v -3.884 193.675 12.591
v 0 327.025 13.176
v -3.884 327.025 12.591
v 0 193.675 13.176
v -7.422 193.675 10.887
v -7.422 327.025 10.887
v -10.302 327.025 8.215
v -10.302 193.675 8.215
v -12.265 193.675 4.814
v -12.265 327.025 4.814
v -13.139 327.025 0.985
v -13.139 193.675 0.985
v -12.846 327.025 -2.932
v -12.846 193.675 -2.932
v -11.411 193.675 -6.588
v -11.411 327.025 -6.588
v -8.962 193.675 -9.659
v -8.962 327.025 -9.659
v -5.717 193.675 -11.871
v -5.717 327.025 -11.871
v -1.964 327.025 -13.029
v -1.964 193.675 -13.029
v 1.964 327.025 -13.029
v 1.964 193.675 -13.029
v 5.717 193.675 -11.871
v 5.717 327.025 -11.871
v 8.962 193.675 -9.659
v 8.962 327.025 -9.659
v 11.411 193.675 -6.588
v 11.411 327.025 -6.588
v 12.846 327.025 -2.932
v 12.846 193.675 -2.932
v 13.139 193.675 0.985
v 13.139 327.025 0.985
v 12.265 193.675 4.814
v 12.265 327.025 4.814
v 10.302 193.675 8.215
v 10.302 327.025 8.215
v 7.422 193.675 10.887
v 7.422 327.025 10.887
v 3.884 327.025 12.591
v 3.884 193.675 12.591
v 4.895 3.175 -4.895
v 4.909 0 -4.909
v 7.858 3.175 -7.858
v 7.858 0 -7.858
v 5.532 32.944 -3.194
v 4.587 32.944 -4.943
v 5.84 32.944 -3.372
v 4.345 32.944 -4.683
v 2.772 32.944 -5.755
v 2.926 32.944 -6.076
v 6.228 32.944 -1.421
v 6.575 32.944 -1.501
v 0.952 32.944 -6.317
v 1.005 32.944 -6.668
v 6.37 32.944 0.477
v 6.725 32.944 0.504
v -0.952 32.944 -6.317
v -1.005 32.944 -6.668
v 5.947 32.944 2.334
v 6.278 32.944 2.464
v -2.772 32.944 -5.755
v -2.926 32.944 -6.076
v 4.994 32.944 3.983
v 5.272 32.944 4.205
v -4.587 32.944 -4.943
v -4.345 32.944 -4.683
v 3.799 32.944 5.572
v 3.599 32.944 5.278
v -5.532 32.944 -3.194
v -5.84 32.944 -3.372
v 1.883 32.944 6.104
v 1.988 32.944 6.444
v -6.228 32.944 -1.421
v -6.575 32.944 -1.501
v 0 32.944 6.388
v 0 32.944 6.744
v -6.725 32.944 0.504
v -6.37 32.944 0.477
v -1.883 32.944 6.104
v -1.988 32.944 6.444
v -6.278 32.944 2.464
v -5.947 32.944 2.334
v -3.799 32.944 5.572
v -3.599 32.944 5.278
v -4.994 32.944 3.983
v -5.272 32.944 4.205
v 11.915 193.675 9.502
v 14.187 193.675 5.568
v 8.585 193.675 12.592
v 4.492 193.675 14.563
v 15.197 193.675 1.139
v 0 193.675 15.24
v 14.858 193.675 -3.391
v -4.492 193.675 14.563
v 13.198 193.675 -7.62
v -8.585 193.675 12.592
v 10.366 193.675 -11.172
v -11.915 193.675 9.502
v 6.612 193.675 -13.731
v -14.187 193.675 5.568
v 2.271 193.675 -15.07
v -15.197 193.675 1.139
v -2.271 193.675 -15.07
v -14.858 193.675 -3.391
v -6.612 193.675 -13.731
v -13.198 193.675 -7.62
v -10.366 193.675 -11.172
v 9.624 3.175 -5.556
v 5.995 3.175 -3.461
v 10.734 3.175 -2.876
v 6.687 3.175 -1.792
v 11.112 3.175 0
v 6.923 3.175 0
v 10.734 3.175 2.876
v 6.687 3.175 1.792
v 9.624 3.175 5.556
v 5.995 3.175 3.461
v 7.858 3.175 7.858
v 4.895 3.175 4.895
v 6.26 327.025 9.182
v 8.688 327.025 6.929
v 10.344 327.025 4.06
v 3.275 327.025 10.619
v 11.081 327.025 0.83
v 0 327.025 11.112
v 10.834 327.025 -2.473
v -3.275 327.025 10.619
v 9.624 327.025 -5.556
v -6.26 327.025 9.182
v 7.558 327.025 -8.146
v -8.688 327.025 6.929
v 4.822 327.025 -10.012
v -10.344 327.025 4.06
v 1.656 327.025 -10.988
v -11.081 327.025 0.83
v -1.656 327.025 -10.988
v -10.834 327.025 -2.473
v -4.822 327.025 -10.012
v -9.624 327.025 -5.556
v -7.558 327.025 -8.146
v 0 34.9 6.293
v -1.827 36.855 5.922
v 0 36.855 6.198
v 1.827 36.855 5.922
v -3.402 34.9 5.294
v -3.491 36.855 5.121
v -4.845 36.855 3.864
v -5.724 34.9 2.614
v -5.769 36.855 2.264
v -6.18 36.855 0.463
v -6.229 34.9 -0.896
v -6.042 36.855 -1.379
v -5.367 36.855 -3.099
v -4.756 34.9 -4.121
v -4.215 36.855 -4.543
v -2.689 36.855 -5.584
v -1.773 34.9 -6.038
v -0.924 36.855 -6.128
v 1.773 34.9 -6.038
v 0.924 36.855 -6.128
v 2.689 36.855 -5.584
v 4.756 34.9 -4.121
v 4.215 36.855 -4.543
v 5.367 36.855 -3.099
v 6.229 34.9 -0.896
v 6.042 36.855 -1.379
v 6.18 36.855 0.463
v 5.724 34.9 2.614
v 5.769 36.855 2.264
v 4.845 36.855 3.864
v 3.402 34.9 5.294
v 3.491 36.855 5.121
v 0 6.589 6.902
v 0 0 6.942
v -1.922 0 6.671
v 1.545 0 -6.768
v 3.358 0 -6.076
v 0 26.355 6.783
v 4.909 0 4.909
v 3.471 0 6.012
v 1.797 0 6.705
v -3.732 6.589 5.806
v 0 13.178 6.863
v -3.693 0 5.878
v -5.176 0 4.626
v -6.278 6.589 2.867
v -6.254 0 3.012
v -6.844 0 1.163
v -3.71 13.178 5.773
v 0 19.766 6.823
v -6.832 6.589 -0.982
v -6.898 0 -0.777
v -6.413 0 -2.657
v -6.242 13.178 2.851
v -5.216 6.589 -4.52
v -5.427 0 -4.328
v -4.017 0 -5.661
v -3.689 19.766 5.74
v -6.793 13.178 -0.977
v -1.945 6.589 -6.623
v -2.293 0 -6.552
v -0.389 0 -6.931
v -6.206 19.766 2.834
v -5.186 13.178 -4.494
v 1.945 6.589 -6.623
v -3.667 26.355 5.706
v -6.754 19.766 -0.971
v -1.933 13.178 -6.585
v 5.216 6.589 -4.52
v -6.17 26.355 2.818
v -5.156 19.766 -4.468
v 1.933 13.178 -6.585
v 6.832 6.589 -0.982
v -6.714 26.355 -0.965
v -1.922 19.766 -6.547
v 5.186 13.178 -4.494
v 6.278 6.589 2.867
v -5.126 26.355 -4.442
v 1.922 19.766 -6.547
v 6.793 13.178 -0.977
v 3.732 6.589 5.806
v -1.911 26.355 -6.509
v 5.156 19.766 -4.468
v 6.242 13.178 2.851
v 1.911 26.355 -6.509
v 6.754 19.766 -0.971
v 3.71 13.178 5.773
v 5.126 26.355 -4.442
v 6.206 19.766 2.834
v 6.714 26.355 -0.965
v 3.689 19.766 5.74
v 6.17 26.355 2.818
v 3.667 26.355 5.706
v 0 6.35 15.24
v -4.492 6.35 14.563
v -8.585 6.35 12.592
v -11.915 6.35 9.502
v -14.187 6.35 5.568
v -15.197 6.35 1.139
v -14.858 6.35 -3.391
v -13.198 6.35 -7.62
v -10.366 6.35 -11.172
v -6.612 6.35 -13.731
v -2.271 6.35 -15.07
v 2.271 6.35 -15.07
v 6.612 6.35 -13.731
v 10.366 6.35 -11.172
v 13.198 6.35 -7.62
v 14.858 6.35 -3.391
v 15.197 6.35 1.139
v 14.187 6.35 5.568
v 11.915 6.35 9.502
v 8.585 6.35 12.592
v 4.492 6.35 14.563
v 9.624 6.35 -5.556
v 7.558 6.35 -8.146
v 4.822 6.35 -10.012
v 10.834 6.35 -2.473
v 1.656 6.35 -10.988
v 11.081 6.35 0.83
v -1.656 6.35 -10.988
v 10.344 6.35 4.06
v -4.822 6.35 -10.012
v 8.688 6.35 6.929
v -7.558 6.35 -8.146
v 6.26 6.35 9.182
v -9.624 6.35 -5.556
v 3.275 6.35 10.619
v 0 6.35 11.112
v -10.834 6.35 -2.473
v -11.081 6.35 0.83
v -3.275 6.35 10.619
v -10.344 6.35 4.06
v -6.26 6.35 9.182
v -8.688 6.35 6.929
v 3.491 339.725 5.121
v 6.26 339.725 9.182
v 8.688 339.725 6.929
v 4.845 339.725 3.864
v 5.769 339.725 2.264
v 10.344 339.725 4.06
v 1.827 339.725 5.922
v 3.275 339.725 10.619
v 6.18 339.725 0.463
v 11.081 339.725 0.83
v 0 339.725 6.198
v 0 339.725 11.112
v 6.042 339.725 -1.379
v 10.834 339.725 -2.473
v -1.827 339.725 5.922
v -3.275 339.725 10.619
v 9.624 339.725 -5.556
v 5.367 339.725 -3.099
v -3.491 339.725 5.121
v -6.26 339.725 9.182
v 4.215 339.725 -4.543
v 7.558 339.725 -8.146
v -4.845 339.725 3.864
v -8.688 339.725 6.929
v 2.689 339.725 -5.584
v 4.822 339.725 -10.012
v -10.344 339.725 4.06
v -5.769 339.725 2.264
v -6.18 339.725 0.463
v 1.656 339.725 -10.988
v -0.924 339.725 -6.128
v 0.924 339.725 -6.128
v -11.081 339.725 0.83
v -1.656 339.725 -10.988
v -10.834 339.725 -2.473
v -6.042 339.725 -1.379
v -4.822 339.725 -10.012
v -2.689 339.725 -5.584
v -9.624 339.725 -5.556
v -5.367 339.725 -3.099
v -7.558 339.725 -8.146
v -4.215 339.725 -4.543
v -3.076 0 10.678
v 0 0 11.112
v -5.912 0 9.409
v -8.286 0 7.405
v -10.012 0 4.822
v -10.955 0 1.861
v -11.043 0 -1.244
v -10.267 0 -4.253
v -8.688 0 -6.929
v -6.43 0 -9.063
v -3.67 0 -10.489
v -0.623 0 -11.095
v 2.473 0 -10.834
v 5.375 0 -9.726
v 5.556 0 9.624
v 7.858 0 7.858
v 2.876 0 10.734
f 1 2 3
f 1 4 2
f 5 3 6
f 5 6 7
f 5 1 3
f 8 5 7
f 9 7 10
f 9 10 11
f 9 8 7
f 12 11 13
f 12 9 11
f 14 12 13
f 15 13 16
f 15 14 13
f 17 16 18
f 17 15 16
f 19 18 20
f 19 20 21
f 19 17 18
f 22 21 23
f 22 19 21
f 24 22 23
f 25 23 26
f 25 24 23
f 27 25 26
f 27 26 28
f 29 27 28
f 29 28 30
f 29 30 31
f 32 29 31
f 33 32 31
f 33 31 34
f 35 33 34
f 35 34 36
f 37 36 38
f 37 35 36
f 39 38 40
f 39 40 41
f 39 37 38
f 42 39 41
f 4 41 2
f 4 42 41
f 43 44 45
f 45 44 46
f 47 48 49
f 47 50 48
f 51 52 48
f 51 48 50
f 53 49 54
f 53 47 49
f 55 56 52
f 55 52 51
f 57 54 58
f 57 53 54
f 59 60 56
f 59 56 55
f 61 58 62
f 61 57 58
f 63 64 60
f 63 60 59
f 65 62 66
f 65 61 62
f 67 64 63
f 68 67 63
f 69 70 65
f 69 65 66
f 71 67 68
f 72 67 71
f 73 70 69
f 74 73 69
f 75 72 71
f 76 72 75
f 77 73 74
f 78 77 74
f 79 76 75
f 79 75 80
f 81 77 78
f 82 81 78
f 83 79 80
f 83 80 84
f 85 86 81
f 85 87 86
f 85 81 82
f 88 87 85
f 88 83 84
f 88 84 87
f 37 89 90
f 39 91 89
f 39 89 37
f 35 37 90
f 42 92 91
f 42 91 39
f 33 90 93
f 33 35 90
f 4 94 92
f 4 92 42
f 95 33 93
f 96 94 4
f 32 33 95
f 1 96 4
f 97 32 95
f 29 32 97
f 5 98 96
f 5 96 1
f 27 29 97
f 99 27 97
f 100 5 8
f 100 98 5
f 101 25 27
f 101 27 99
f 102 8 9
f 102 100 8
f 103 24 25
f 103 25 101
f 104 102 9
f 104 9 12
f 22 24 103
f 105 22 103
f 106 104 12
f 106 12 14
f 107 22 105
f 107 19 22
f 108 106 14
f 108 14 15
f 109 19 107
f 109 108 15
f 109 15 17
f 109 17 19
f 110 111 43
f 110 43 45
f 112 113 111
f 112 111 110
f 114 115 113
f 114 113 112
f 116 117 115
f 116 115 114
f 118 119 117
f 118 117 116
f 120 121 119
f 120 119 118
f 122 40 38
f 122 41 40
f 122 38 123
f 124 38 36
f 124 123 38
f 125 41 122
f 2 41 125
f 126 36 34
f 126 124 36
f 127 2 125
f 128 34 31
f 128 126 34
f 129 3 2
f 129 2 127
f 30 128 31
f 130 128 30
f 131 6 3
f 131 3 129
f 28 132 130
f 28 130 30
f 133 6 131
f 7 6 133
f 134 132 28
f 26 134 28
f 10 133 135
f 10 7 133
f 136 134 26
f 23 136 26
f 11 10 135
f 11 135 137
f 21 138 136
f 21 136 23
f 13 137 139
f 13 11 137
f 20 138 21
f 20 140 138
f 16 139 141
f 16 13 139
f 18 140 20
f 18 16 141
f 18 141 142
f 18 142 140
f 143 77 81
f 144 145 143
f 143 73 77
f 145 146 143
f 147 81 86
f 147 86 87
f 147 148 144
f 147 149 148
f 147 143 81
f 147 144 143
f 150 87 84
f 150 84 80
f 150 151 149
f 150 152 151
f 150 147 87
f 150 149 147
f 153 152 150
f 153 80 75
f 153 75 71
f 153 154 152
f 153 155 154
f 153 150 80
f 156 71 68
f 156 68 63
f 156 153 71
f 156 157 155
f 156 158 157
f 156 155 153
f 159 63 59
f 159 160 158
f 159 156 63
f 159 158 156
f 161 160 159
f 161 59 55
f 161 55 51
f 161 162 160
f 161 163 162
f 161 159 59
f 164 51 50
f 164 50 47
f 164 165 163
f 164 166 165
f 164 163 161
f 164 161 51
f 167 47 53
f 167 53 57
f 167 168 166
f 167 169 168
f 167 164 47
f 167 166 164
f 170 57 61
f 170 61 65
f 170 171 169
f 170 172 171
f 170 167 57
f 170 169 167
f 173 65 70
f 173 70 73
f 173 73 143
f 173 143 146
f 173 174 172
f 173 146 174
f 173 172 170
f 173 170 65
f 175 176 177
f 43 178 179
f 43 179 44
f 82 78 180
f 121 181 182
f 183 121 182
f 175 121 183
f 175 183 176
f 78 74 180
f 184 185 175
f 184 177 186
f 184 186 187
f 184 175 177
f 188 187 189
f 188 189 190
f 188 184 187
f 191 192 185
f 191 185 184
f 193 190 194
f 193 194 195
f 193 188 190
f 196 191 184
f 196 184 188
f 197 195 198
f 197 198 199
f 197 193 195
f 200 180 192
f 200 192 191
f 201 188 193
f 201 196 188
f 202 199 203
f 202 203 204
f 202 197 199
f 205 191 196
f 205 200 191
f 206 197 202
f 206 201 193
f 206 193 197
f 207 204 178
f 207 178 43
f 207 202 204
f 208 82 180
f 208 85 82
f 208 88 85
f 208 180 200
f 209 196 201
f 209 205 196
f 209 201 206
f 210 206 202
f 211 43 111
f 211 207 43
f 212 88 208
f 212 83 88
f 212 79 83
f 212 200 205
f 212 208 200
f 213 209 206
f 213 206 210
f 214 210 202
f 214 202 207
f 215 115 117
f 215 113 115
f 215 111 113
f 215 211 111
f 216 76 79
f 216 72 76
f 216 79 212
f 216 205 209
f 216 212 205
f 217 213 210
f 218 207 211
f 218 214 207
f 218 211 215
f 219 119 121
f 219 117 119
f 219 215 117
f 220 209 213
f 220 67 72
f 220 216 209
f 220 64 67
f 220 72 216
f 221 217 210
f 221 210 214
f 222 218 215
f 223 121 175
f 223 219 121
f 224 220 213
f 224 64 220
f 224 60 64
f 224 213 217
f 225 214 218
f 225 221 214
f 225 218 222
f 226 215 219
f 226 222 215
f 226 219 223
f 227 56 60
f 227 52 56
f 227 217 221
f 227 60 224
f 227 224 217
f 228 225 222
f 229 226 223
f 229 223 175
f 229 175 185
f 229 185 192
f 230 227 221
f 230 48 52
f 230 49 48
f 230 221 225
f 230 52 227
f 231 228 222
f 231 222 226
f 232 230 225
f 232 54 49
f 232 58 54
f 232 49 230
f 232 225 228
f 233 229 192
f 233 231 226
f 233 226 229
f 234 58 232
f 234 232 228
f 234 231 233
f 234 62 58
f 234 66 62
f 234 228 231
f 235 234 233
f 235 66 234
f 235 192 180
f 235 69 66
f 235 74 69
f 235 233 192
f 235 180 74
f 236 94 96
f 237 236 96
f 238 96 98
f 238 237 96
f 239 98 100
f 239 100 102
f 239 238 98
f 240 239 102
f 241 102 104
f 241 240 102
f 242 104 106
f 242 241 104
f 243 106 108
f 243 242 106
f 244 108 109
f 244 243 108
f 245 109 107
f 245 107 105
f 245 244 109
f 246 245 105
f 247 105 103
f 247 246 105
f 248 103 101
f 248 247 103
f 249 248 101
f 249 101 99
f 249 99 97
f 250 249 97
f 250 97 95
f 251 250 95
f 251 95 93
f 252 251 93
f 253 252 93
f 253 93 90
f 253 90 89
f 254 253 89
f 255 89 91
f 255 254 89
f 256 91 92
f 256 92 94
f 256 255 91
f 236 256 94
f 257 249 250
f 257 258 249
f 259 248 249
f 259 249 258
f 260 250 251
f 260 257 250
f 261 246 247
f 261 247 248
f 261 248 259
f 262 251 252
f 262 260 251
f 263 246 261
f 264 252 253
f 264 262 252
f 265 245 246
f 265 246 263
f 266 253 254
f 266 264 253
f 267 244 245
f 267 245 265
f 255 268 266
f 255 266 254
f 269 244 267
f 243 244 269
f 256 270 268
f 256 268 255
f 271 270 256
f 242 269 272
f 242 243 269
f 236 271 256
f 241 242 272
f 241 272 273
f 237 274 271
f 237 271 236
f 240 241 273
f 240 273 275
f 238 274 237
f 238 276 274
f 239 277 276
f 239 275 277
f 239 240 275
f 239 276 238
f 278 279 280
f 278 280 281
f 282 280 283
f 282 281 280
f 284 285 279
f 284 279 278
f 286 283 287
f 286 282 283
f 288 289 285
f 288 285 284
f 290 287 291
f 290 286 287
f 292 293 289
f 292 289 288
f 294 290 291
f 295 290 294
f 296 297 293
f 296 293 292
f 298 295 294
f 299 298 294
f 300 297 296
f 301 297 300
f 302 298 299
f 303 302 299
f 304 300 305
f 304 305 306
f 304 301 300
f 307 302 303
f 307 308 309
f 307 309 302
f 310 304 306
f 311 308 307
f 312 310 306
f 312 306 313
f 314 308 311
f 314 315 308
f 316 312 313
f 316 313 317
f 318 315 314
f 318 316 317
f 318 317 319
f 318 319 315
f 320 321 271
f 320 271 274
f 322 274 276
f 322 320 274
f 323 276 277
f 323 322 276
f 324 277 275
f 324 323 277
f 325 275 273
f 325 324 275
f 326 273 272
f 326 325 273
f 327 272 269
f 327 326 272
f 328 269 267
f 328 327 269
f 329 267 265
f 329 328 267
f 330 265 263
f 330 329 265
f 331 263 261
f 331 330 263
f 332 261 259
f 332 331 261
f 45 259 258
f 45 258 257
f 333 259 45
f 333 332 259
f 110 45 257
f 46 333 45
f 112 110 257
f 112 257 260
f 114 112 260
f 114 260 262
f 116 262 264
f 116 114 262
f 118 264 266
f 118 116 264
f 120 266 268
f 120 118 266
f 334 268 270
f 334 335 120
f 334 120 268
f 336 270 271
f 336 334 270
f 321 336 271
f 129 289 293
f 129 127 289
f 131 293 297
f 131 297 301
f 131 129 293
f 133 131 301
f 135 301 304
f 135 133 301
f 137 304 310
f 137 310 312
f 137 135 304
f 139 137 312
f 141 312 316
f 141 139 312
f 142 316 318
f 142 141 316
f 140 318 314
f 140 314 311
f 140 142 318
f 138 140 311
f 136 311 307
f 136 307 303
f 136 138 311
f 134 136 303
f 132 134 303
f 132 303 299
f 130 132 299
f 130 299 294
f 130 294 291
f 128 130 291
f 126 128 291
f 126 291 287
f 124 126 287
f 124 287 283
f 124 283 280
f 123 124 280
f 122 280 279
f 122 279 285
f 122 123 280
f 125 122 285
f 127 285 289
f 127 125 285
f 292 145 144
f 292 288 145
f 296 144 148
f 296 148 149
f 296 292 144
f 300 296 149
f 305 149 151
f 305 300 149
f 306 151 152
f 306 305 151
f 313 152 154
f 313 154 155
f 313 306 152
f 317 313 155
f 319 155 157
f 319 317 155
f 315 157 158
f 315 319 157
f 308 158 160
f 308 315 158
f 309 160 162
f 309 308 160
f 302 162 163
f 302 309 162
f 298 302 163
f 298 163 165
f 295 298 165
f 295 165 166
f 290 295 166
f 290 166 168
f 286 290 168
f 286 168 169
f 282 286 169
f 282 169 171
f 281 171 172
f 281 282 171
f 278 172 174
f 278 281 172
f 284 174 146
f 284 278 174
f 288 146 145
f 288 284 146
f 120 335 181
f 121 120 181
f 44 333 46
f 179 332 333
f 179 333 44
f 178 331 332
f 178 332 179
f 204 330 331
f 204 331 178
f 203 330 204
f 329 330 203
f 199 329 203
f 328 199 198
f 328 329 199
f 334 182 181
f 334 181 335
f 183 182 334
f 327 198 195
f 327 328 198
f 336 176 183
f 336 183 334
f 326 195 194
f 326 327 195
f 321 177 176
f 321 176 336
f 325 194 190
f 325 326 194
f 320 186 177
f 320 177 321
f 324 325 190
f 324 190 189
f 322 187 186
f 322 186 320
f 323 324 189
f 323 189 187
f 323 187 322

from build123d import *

# Parameters (mm, degrees)
F2_R     = 1.5875
F3_DEPTH = 25.4
F5_DEPTH = 3.175


with BuildPart() as f1:
    # F0 (on Right) → F1 (revolve)
    with BuildSketch(Plane.YZ):
        Polygon((0, 11.1125), (0, 6.94182), (32.9438, 6.7437), (32.9438, 6.3881), (36.8554, 6.1976), (339.725, 6.1976), (339.725, 11.1125), (327.025, 11.1125), (327.025, 13.17625), (193.675, 13.17625), (193.675, 15.24), (6.35, 15.24), (6.35, 11.1125), align=None)
    revolve(axis=Axis((0, 169.8625, 0), (0, -1, 0)))

    # F2 (on Top) → F3 (cut)
    with BuildSketch(Plane.XY):
        with Locations((0, 355.6)):
            Circle(F2_R)
    extrude(amount=F3_DEPTH, mode=Mode.SUBTRACT)

    # F4 (on face) → F5 (cut)
    with BuildSketch(Plane.XZ):
        Polygon((9.192321, 9.192321), (0, 0), (14.158506, -14.158506), (23.104484, -14.158506), (23.104484, 9.648457), align=None)
    extrude(amount=-F5_DEPTH, mode=Mode.SUBTRACT)


solid = f1.part
